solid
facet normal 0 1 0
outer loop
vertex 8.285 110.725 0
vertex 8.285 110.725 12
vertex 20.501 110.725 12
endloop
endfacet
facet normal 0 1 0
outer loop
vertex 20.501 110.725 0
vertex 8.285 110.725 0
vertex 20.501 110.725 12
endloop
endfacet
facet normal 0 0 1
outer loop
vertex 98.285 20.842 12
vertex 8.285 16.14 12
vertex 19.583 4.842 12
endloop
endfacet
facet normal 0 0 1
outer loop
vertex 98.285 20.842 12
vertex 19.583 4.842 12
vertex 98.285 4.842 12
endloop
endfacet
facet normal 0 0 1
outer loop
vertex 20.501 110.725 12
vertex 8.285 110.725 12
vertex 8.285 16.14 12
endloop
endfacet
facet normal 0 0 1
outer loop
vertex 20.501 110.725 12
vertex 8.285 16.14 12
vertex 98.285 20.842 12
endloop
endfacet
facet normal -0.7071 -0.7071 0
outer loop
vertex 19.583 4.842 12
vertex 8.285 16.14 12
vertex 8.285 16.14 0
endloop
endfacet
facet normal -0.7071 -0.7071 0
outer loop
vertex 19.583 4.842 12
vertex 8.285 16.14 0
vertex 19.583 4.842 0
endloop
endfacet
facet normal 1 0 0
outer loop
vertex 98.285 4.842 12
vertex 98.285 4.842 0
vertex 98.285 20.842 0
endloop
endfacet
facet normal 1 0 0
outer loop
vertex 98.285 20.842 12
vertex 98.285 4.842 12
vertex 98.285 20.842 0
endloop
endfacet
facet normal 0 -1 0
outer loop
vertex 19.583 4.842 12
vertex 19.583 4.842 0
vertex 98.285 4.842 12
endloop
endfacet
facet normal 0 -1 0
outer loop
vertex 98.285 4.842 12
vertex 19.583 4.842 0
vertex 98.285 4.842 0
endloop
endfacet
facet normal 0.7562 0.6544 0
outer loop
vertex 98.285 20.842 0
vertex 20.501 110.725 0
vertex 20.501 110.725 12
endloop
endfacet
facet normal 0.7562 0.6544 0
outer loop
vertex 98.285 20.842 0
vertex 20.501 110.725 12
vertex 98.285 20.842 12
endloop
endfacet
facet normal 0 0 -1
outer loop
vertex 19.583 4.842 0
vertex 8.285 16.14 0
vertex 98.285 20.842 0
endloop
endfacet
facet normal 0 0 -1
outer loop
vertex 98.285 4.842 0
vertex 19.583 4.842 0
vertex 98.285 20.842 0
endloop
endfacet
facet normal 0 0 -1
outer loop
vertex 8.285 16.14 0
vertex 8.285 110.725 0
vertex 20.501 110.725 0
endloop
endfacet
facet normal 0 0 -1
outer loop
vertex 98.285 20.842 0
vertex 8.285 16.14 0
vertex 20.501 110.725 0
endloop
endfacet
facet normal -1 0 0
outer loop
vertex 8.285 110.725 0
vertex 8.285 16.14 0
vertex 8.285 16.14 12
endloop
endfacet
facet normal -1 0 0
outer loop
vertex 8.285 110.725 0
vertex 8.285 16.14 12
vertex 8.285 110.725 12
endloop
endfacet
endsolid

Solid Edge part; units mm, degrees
sketch "Sketch1" plane through (0, 0, 0) normal (0, 0, 1) x (1, 0, 0)
  line L0 (8.2849, 4.8418) -> (98.2849, 4.8418)
  line L1 (98.2849, 4.8418) -> (98.2849, 20.8418)
  line L2 (8.2849, 124.8418) -> (98.2849, 20.8418)
  line L3 (8.2849, 4.8418) -> (8.2849, 124.8418)
extrude "Protrusion1" add sketch "Sketch1" along normal blind 12
sketch "Sketch2" plane through (53.2849, 64.8418, 12) normal (0, 0, 1) x (1, 0, 0)
  line L0 (-45, -48.7017) -> (-33.6863, -60.0155)
  line L1 (-33.6863, -60.0155) -> (-45, -60)
  line L2 (-45, -60) -> (-45, -48.7017)
  line L3 (-45, 45.8836) -> (-32.7839, 45.8836)
  line L4 (-32.7839, 45.8836) -> (-45, 60)
  line L5 (-45, 60) -> (-45, 45.8836)
extrude "ExtrudedCutout_1" cut sketch "Sketch2" against normal blind 382.4584
